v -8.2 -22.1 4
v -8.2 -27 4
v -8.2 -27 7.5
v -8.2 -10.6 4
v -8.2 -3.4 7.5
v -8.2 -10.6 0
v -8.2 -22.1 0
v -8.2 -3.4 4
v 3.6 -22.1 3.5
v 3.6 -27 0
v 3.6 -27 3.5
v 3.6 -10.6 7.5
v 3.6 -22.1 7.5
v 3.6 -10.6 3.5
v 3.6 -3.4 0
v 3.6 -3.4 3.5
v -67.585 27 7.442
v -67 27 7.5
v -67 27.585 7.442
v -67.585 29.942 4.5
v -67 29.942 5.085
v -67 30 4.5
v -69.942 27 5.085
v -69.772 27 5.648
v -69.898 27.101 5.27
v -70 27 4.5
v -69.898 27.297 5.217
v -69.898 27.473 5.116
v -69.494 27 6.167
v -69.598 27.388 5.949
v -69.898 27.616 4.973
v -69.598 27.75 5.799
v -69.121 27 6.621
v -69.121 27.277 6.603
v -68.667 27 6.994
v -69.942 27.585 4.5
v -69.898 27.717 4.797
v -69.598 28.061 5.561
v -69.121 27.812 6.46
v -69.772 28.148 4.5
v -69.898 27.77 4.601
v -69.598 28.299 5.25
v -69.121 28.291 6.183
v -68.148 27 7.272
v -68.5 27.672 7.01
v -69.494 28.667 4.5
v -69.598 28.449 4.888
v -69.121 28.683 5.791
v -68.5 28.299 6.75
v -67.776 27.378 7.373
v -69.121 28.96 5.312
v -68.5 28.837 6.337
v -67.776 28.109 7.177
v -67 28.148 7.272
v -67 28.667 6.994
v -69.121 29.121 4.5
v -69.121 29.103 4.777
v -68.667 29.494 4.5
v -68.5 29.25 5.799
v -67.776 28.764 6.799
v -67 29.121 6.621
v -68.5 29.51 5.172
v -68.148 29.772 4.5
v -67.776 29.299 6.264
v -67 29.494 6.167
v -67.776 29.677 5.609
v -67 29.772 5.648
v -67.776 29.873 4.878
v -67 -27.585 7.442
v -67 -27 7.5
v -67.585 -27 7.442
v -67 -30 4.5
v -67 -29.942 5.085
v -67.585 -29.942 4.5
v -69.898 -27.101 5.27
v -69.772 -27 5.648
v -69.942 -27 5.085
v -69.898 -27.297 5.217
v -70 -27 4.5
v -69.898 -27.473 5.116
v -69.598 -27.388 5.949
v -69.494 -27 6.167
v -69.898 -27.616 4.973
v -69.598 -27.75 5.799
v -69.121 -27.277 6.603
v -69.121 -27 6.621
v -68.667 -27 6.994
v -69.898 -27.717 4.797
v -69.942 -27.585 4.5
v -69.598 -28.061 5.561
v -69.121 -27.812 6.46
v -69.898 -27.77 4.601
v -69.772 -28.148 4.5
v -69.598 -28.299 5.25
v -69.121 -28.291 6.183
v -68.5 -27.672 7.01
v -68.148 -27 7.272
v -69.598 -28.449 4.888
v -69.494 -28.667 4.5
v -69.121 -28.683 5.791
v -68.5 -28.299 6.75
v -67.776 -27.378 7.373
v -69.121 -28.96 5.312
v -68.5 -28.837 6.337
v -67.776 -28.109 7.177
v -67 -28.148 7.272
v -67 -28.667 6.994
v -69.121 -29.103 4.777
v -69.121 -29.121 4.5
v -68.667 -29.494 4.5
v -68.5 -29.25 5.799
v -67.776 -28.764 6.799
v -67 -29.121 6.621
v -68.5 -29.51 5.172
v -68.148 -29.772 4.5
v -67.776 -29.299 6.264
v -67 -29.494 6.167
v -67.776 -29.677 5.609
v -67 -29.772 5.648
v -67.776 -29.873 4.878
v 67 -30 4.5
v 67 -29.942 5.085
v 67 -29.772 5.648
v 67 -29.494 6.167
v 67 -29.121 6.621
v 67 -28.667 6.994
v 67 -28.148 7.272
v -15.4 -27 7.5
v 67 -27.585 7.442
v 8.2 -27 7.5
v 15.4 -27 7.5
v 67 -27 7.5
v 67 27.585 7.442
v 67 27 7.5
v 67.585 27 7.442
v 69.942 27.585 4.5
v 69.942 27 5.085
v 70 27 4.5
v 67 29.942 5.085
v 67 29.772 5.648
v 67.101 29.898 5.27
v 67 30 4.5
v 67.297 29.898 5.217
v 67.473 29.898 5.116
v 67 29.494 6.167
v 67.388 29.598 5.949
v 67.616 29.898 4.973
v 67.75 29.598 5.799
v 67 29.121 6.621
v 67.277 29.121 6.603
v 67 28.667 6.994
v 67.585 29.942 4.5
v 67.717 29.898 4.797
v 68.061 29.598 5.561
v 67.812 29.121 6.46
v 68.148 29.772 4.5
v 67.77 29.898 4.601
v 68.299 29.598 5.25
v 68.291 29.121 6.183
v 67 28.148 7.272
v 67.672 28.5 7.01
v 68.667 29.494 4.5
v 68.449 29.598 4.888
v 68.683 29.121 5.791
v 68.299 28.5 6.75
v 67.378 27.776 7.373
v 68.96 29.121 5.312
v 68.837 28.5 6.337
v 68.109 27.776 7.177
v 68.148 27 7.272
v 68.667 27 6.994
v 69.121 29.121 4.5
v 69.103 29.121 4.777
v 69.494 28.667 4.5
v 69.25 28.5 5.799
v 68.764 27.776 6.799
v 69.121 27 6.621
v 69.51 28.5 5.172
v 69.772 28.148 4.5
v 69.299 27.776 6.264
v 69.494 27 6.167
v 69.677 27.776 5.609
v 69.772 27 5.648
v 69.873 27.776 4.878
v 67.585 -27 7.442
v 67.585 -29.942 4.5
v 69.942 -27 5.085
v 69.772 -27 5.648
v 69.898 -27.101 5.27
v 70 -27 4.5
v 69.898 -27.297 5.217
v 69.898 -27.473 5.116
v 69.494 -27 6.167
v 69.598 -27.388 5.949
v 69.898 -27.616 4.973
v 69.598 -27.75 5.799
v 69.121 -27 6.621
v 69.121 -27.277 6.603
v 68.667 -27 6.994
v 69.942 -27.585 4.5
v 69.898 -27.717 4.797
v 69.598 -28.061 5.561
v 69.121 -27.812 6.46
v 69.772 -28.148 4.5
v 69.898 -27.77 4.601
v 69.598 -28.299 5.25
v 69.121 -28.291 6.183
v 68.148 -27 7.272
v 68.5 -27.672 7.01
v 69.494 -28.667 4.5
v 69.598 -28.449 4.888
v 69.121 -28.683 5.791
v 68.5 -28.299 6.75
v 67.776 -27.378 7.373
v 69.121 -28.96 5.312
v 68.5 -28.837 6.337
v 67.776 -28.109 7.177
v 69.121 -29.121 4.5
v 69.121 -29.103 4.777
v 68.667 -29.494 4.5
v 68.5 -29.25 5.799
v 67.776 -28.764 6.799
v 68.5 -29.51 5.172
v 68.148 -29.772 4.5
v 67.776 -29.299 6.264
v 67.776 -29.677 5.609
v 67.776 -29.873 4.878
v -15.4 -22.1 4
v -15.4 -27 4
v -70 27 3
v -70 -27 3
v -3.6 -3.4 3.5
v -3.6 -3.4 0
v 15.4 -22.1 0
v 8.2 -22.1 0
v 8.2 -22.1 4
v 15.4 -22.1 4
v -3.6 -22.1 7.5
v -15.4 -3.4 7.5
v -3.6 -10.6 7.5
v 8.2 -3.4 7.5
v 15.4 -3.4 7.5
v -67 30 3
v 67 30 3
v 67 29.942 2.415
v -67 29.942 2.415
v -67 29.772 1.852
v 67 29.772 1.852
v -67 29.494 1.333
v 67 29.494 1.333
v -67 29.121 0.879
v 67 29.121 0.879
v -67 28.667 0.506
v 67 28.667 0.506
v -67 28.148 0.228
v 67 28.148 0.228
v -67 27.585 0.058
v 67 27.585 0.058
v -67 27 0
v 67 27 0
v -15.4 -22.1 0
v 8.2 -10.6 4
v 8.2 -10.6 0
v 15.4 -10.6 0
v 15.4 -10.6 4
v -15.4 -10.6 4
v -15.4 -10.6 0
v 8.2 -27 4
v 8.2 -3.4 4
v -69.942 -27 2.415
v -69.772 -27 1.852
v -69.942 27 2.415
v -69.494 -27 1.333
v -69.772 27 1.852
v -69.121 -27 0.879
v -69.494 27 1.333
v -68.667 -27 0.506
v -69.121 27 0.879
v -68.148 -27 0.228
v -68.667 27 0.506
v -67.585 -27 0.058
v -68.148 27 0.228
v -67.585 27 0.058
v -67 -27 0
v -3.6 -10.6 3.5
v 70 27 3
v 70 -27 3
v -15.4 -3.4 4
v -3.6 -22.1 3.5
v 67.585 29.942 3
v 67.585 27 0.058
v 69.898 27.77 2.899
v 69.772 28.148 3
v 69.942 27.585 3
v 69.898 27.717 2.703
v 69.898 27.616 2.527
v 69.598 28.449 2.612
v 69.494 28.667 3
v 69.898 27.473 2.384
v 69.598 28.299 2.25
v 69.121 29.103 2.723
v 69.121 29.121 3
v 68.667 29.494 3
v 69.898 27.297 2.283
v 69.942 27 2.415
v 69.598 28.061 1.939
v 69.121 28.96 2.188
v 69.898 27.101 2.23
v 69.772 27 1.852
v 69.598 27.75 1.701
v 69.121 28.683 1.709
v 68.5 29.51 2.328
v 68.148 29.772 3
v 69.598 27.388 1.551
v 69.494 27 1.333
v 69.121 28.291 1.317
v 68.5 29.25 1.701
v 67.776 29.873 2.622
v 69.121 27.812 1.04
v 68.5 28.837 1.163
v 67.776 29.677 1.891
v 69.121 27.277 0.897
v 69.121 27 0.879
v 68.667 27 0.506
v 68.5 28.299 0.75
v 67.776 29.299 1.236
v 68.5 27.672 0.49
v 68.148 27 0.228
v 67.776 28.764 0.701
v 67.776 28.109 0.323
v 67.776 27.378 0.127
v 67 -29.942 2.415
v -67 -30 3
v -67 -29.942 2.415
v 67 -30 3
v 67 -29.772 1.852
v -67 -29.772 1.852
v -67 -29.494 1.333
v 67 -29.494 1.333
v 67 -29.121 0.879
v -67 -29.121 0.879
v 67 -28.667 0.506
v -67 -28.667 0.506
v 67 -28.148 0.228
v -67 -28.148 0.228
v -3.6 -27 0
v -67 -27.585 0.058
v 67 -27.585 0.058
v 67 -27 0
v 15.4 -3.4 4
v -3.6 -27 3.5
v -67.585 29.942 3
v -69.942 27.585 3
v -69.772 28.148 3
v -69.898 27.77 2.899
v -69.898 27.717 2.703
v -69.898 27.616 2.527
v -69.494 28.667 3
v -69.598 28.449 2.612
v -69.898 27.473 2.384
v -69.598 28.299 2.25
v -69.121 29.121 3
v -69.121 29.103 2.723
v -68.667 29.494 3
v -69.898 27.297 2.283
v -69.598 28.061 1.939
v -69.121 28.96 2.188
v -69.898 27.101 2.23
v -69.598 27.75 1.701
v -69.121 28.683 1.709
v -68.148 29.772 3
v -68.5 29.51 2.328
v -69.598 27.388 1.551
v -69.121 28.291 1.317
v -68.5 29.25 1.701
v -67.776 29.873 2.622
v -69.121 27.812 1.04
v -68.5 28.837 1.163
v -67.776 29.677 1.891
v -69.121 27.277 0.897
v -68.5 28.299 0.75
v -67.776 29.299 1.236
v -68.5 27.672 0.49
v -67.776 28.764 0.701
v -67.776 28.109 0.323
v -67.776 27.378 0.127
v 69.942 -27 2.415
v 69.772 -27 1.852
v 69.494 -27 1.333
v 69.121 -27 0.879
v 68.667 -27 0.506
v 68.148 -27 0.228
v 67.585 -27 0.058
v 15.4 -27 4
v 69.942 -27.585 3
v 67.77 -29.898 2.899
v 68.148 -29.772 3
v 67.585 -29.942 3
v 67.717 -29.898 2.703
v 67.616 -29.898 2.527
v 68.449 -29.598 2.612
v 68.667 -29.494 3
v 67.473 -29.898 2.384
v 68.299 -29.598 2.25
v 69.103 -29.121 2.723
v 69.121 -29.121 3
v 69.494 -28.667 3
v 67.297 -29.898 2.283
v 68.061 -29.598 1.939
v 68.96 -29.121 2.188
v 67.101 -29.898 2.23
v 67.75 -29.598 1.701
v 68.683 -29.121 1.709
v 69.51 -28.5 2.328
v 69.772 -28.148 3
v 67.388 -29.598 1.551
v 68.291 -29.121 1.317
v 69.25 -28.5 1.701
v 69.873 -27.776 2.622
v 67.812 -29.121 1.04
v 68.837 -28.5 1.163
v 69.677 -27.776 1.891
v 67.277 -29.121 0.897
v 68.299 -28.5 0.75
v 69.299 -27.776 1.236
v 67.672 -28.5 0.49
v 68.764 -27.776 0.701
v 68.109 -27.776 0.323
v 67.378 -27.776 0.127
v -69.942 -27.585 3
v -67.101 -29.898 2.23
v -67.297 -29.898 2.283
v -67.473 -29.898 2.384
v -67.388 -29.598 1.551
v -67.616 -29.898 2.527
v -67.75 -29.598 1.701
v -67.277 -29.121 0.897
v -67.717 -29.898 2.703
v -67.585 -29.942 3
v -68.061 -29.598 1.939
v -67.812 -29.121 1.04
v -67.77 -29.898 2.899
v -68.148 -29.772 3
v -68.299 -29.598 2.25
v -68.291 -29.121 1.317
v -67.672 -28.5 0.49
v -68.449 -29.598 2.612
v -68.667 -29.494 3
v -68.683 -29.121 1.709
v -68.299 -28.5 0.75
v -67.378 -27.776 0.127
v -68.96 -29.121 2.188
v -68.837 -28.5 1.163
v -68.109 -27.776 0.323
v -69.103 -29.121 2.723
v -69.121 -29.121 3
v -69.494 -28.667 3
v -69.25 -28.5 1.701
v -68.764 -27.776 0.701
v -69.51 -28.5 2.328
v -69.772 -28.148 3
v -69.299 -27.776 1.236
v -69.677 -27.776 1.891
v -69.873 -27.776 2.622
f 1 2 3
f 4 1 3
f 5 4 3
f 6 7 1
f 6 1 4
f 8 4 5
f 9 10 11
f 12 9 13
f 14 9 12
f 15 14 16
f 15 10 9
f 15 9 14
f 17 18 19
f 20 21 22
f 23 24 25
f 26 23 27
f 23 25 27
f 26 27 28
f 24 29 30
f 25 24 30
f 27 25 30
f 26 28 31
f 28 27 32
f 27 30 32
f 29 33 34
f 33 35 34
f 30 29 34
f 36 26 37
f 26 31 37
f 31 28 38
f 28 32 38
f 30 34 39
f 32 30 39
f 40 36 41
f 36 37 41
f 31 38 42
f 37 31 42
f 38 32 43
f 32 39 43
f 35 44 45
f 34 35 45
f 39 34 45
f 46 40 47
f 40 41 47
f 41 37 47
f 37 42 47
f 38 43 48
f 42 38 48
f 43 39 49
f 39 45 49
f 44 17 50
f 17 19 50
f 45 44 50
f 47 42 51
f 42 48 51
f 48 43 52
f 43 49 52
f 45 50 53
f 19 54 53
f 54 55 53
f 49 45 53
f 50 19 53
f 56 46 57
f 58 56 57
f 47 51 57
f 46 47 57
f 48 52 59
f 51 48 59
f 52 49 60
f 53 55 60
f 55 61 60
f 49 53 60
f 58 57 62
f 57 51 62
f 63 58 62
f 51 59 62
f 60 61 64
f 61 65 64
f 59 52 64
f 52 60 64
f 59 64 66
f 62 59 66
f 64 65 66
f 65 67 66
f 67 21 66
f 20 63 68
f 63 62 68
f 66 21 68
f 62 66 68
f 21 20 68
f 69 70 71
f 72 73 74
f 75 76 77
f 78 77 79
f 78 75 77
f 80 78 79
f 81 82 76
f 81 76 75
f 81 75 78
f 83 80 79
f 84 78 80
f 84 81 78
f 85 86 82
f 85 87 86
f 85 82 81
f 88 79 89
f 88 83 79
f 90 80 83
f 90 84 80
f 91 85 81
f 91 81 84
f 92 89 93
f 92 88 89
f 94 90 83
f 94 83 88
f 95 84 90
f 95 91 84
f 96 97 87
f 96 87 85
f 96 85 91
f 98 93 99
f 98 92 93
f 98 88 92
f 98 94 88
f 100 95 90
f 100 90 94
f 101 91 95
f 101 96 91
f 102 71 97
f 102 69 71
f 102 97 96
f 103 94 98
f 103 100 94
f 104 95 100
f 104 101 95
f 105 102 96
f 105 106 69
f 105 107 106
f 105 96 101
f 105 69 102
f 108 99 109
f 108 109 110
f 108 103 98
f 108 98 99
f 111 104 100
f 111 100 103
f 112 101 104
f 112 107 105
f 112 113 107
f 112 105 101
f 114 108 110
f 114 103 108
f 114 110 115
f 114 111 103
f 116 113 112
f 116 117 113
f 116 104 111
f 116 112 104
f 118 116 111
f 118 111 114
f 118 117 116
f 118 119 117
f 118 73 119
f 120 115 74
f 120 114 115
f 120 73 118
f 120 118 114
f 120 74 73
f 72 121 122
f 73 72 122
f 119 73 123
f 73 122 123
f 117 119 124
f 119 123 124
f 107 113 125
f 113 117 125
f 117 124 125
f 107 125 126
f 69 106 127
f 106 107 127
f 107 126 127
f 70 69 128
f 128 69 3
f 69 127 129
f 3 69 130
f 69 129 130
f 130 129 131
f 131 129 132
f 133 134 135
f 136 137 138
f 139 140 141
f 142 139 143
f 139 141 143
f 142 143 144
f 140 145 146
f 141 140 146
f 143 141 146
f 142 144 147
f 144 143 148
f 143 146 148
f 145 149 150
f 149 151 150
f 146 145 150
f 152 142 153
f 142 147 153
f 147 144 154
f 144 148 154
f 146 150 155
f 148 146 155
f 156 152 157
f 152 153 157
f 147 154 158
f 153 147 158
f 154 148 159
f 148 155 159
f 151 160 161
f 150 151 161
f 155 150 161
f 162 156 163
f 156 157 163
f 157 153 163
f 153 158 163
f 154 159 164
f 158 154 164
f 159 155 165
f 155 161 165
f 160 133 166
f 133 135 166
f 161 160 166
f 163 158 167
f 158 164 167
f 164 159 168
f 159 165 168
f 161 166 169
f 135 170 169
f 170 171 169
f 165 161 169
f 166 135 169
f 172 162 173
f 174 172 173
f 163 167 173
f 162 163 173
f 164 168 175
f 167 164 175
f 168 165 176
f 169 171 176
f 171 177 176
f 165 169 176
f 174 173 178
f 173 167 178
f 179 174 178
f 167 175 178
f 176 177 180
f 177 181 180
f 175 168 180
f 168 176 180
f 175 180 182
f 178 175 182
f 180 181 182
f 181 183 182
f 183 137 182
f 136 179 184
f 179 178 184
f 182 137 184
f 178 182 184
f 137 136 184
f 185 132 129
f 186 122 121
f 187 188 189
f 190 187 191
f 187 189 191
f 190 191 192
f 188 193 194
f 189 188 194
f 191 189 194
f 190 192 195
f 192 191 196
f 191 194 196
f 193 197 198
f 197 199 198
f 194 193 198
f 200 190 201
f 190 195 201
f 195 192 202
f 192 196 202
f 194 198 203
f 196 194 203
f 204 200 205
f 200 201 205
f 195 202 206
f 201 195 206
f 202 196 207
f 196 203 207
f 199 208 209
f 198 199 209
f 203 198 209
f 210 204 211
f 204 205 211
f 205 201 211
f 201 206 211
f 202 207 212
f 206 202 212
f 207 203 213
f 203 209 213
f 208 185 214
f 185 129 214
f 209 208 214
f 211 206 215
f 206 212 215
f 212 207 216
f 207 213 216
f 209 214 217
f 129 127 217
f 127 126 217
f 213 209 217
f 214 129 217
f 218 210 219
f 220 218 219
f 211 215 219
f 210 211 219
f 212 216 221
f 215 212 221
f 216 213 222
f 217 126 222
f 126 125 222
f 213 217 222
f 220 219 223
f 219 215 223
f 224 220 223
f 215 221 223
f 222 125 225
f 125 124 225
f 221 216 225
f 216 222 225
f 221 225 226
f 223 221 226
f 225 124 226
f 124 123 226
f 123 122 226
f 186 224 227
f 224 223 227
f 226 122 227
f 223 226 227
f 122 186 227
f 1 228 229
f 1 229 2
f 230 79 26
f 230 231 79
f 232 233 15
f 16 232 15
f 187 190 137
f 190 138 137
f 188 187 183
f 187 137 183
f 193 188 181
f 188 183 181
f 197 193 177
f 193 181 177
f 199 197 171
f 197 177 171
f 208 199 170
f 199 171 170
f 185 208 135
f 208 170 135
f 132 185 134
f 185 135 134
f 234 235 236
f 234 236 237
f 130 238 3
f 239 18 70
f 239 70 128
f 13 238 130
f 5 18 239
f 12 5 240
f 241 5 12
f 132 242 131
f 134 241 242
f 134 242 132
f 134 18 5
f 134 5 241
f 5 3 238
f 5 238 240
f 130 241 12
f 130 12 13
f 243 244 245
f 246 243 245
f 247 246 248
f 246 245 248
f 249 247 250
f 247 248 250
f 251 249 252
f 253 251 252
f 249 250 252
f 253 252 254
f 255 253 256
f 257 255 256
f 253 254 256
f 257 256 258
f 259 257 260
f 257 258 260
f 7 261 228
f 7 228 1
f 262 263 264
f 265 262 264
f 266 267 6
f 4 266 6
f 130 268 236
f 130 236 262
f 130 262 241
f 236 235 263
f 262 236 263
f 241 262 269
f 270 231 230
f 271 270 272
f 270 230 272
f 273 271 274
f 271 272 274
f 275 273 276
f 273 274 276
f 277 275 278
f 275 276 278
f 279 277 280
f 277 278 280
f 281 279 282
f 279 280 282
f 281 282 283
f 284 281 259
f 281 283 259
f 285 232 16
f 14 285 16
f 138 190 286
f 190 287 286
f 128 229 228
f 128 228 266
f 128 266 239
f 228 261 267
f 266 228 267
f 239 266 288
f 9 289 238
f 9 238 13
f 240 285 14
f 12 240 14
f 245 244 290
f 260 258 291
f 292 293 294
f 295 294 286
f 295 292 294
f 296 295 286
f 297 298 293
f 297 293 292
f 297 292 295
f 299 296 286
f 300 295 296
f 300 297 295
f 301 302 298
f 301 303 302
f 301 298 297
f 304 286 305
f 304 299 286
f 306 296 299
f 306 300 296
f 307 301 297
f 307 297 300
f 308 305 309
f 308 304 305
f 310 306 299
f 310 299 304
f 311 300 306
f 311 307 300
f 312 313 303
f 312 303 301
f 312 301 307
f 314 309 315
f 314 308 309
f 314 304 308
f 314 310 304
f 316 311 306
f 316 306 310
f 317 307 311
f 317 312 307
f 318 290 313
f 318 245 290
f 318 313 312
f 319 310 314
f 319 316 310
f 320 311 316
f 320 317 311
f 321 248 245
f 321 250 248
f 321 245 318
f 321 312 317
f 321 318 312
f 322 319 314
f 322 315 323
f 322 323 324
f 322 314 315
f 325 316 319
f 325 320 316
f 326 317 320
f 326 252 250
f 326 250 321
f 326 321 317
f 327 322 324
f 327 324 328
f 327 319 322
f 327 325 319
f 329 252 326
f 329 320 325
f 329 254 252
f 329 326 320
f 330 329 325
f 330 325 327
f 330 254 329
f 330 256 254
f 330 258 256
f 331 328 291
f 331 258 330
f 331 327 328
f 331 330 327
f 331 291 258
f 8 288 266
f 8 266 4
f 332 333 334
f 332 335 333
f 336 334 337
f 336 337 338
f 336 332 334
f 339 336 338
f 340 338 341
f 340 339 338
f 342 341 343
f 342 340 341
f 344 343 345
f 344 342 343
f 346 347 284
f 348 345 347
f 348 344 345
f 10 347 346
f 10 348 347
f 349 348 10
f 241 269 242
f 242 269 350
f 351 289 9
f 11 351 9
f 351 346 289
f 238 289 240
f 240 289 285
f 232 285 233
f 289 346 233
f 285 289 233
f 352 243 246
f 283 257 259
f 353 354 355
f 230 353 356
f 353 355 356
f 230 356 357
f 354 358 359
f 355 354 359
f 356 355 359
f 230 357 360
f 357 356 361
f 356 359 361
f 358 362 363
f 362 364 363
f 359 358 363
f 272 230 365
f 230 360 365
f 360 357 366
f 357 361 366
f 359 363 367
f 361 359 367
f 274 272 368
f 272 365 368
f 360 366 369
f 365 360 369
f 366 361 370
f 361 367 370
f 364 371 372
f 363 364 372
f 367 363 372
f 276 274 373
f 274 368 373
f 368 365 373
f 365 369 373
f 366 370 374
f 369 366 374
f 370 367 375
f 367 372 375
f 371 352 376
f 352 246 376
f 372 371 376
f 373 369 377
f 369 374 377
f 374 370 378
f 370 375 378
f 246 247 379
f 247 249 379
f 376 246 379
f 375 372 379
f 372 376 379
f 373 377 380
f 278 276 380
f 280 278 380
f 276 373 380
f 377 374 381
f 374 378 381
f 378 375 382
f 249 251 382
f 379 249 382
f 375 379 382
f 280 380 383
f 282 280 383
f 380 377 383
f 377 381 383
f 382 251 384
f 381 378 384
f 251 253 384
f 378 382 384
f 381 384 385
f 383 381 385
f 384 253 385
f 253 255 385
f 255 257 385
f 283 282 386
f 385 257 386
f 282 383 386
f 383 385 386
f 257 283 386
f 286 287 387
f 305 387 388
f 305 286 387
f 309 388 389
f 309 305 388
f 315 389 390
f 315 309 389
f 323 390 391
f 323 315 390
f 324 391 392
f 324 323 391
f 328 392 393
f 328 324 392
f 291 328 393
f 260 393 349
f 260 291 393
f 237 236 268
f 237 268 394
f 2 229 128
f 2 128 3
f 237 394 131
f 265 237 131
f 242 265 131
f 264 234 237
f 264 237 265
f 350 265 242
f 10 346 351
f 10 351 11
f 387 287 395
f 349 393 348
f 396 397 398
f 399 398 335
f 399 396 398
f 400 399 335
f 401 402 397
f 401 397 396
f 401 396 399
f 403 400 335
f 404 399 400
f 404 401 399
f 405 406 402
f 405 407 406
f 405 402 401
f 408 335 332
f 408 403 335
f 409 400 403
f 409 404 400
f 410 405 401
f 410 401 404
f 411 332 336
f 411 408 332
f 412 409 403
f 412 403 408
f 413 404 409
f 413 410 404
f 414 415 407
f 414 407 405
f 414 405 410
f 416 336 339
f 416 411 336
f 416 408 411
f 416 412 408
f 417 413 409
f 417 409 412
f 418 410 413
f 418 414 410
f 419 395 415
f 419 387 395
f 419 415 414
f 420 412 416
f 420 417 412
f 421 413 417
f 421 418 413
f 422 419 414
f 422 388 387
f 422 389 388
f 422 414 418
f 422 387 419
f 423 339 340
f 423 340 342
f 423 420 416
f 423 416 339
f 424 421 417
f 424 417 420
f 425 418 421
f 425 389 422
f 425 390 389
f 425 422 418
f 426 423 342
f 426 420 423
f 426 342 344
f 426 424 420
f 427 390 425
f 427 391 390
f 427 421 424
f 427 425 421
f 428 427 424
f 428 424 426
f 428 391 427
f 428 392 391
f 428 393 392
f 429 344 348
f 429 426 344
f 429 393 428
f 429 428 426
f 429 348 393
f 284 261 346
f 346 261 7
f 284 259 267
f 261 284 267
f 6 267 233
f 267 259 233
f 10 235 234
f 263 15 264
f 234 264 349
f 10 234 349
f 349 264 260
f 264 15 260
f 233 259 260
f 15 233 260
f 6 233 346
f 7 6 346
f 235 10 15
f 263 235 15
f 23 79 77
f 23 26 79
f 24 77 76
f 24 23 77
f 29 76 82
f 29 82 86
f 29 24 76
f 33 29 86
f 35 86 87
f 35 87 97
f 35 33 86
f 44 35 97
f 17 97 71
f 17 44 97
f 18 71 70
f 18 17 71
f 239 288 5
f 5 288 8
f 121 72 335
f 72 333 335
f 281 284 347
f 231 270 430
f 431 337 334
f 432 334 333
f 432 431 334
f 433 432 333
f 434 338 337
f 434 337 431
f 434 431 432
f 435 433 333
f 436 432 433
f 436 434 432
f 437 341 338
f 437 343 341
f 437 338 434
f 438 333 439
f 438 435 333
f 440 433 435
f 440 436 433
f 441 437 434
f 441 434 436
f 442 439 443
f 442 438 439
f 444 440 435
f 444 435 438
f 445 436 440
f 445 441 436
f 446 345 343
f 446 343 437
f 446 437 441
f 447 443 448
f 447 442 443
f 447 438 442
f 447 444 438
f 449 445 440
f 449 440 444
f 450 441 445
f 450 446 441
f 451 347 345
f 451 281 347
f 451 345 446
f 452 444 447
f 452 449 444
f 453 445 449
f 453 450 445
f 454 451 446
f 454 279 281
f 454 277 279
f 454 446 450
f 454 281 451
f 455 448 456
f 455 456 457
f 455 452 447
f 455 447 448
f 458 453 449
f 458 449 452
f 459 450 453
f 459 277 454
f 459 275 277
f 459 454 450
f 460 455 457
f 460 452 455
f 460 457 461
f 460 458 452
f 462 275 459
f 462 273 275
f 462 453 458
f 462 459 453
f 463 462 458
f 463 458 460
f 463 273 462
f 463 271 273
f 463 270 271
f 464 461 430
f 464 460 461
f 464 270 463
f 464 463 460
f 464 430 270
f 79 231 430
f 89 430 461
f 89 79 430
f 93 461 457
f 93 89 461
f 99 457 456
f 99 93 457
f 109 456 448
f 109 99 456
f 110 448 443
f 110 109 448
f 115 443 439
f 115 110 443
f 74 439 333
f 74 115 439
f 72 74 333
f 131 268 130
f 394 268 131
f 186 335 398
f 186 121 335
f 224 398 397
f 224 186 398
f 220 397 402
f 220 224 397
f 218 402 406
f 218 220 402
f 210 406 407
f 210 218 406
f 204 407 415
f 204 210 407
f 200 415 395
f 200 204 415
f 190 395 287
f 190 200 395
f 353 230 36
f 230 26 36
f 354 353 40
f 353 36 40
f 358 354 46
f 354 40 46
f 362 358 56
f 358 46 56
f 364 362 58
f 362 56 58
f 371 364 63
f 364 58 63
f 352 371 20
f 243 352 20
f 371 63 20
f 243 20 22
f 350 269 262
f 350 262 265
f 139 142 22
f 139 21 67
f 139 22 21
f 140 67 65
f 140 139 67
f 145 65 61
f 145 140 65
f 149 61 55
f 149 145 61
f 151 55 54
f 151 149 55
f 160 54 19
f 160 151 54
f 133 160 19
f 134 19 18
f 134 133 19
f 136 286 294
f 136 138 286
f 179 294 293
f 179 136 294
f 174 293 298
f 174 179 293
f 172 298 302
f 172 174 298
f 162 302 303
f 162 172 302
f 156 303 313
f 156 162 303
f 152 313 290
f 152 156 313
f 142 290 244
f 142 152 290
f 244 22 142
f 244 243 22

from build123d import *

# Parameters (mm, degrees)
F0_W     = 140
F0_H     = 60
F1_DEPTH = 7.5
F2_R     = 3
F3_W     = 7.2
F3_H     = 7.2
F3_H_2   = 4.9
F4_DEPTH = 3.5
F3_H_3   = 11.5
F5_DEPTH = 10
F6_DEPTH = 25
F7_START = 4
F7_DEPTH = 6


with BuildPart() as f1:
    # F0 (on Top) → F1 (new body)
    with BuildSketch(Plane.XY):
        Rectangle(F0_W, F0_H)
    extrude(amount=F1_DEPTH)

    # F2
    f2_edges = [f1.edges().sort_by_distance(p)[0] for p in [
        (0, -30, 7.5),
        (70, 0, 7.5),
        (0, 30, 7.5),
        (-70, 0, 7.5),
        (0, 30, 0),
        (70, 30, 3.75),
        (70, 0, 0),
        (70, -30, 3.75),
        (-70, 30, 3.75),
        (-70, 0, 0),
        (0, -30, 0),
        (-70, -30, 3.75),
    ]]
    fillet(f2_edges, radius=F2_R)

    # F3 (on Top) → F4 (cut)
    with BuildSketch(Plane.XY):
        with Locations((0, -7)):
            Rectangle(F3_W, F3_H)
        with Locations((0, -24.55)):
            Rectangle(F3_W, F3_H_2)
    extrude(amount=F4_DEPTH, mode=Mode.SUBTRACT)

    # F3 (on Top) → F5 (cut)
    with BuildSketch(Plane.XY):
        with Locations((0, -16.35)):
            Rectangle(F3_W, F3_H_3)
    extrude(amount=F5_DEPTH, mode=Mode.SUBTRACT)

    # F3 (on Top) → F6 (cut)
    with BuildSketch(Plane.XY):
        with Locations((-11.8, -16.35)):
            Rectangle(F3_W, F3_H_3)
        with Locations((11.8, -16.3500007004)):
            Rectangle(F3_W, F3_H_3)
    extrude(amount=F6_DEPTH, mode=Mode.SUBTRACT)

    # F3 (on Top) → F7 (cut)
    with BuildSketch(Plane.XY.offset(F7_START)):
        with Locations((-11.8, -24.55)):
            Rectangle(F3_W, F3_H_2)
        with Locations((-11.8, -7)):
            Rectangle(F3_W, F3_H)
        with Locations((11.8, -7.0000007004)):
            Rectangle(F3_W, F3_H)
        with Locations((11.8, -24.5500007004)):
            Rectangle(F3_W, F3_H_2)
    extrude(amount=F7_DEPTH, mode=Mode.SUBTRACT)


solid = f1.part
